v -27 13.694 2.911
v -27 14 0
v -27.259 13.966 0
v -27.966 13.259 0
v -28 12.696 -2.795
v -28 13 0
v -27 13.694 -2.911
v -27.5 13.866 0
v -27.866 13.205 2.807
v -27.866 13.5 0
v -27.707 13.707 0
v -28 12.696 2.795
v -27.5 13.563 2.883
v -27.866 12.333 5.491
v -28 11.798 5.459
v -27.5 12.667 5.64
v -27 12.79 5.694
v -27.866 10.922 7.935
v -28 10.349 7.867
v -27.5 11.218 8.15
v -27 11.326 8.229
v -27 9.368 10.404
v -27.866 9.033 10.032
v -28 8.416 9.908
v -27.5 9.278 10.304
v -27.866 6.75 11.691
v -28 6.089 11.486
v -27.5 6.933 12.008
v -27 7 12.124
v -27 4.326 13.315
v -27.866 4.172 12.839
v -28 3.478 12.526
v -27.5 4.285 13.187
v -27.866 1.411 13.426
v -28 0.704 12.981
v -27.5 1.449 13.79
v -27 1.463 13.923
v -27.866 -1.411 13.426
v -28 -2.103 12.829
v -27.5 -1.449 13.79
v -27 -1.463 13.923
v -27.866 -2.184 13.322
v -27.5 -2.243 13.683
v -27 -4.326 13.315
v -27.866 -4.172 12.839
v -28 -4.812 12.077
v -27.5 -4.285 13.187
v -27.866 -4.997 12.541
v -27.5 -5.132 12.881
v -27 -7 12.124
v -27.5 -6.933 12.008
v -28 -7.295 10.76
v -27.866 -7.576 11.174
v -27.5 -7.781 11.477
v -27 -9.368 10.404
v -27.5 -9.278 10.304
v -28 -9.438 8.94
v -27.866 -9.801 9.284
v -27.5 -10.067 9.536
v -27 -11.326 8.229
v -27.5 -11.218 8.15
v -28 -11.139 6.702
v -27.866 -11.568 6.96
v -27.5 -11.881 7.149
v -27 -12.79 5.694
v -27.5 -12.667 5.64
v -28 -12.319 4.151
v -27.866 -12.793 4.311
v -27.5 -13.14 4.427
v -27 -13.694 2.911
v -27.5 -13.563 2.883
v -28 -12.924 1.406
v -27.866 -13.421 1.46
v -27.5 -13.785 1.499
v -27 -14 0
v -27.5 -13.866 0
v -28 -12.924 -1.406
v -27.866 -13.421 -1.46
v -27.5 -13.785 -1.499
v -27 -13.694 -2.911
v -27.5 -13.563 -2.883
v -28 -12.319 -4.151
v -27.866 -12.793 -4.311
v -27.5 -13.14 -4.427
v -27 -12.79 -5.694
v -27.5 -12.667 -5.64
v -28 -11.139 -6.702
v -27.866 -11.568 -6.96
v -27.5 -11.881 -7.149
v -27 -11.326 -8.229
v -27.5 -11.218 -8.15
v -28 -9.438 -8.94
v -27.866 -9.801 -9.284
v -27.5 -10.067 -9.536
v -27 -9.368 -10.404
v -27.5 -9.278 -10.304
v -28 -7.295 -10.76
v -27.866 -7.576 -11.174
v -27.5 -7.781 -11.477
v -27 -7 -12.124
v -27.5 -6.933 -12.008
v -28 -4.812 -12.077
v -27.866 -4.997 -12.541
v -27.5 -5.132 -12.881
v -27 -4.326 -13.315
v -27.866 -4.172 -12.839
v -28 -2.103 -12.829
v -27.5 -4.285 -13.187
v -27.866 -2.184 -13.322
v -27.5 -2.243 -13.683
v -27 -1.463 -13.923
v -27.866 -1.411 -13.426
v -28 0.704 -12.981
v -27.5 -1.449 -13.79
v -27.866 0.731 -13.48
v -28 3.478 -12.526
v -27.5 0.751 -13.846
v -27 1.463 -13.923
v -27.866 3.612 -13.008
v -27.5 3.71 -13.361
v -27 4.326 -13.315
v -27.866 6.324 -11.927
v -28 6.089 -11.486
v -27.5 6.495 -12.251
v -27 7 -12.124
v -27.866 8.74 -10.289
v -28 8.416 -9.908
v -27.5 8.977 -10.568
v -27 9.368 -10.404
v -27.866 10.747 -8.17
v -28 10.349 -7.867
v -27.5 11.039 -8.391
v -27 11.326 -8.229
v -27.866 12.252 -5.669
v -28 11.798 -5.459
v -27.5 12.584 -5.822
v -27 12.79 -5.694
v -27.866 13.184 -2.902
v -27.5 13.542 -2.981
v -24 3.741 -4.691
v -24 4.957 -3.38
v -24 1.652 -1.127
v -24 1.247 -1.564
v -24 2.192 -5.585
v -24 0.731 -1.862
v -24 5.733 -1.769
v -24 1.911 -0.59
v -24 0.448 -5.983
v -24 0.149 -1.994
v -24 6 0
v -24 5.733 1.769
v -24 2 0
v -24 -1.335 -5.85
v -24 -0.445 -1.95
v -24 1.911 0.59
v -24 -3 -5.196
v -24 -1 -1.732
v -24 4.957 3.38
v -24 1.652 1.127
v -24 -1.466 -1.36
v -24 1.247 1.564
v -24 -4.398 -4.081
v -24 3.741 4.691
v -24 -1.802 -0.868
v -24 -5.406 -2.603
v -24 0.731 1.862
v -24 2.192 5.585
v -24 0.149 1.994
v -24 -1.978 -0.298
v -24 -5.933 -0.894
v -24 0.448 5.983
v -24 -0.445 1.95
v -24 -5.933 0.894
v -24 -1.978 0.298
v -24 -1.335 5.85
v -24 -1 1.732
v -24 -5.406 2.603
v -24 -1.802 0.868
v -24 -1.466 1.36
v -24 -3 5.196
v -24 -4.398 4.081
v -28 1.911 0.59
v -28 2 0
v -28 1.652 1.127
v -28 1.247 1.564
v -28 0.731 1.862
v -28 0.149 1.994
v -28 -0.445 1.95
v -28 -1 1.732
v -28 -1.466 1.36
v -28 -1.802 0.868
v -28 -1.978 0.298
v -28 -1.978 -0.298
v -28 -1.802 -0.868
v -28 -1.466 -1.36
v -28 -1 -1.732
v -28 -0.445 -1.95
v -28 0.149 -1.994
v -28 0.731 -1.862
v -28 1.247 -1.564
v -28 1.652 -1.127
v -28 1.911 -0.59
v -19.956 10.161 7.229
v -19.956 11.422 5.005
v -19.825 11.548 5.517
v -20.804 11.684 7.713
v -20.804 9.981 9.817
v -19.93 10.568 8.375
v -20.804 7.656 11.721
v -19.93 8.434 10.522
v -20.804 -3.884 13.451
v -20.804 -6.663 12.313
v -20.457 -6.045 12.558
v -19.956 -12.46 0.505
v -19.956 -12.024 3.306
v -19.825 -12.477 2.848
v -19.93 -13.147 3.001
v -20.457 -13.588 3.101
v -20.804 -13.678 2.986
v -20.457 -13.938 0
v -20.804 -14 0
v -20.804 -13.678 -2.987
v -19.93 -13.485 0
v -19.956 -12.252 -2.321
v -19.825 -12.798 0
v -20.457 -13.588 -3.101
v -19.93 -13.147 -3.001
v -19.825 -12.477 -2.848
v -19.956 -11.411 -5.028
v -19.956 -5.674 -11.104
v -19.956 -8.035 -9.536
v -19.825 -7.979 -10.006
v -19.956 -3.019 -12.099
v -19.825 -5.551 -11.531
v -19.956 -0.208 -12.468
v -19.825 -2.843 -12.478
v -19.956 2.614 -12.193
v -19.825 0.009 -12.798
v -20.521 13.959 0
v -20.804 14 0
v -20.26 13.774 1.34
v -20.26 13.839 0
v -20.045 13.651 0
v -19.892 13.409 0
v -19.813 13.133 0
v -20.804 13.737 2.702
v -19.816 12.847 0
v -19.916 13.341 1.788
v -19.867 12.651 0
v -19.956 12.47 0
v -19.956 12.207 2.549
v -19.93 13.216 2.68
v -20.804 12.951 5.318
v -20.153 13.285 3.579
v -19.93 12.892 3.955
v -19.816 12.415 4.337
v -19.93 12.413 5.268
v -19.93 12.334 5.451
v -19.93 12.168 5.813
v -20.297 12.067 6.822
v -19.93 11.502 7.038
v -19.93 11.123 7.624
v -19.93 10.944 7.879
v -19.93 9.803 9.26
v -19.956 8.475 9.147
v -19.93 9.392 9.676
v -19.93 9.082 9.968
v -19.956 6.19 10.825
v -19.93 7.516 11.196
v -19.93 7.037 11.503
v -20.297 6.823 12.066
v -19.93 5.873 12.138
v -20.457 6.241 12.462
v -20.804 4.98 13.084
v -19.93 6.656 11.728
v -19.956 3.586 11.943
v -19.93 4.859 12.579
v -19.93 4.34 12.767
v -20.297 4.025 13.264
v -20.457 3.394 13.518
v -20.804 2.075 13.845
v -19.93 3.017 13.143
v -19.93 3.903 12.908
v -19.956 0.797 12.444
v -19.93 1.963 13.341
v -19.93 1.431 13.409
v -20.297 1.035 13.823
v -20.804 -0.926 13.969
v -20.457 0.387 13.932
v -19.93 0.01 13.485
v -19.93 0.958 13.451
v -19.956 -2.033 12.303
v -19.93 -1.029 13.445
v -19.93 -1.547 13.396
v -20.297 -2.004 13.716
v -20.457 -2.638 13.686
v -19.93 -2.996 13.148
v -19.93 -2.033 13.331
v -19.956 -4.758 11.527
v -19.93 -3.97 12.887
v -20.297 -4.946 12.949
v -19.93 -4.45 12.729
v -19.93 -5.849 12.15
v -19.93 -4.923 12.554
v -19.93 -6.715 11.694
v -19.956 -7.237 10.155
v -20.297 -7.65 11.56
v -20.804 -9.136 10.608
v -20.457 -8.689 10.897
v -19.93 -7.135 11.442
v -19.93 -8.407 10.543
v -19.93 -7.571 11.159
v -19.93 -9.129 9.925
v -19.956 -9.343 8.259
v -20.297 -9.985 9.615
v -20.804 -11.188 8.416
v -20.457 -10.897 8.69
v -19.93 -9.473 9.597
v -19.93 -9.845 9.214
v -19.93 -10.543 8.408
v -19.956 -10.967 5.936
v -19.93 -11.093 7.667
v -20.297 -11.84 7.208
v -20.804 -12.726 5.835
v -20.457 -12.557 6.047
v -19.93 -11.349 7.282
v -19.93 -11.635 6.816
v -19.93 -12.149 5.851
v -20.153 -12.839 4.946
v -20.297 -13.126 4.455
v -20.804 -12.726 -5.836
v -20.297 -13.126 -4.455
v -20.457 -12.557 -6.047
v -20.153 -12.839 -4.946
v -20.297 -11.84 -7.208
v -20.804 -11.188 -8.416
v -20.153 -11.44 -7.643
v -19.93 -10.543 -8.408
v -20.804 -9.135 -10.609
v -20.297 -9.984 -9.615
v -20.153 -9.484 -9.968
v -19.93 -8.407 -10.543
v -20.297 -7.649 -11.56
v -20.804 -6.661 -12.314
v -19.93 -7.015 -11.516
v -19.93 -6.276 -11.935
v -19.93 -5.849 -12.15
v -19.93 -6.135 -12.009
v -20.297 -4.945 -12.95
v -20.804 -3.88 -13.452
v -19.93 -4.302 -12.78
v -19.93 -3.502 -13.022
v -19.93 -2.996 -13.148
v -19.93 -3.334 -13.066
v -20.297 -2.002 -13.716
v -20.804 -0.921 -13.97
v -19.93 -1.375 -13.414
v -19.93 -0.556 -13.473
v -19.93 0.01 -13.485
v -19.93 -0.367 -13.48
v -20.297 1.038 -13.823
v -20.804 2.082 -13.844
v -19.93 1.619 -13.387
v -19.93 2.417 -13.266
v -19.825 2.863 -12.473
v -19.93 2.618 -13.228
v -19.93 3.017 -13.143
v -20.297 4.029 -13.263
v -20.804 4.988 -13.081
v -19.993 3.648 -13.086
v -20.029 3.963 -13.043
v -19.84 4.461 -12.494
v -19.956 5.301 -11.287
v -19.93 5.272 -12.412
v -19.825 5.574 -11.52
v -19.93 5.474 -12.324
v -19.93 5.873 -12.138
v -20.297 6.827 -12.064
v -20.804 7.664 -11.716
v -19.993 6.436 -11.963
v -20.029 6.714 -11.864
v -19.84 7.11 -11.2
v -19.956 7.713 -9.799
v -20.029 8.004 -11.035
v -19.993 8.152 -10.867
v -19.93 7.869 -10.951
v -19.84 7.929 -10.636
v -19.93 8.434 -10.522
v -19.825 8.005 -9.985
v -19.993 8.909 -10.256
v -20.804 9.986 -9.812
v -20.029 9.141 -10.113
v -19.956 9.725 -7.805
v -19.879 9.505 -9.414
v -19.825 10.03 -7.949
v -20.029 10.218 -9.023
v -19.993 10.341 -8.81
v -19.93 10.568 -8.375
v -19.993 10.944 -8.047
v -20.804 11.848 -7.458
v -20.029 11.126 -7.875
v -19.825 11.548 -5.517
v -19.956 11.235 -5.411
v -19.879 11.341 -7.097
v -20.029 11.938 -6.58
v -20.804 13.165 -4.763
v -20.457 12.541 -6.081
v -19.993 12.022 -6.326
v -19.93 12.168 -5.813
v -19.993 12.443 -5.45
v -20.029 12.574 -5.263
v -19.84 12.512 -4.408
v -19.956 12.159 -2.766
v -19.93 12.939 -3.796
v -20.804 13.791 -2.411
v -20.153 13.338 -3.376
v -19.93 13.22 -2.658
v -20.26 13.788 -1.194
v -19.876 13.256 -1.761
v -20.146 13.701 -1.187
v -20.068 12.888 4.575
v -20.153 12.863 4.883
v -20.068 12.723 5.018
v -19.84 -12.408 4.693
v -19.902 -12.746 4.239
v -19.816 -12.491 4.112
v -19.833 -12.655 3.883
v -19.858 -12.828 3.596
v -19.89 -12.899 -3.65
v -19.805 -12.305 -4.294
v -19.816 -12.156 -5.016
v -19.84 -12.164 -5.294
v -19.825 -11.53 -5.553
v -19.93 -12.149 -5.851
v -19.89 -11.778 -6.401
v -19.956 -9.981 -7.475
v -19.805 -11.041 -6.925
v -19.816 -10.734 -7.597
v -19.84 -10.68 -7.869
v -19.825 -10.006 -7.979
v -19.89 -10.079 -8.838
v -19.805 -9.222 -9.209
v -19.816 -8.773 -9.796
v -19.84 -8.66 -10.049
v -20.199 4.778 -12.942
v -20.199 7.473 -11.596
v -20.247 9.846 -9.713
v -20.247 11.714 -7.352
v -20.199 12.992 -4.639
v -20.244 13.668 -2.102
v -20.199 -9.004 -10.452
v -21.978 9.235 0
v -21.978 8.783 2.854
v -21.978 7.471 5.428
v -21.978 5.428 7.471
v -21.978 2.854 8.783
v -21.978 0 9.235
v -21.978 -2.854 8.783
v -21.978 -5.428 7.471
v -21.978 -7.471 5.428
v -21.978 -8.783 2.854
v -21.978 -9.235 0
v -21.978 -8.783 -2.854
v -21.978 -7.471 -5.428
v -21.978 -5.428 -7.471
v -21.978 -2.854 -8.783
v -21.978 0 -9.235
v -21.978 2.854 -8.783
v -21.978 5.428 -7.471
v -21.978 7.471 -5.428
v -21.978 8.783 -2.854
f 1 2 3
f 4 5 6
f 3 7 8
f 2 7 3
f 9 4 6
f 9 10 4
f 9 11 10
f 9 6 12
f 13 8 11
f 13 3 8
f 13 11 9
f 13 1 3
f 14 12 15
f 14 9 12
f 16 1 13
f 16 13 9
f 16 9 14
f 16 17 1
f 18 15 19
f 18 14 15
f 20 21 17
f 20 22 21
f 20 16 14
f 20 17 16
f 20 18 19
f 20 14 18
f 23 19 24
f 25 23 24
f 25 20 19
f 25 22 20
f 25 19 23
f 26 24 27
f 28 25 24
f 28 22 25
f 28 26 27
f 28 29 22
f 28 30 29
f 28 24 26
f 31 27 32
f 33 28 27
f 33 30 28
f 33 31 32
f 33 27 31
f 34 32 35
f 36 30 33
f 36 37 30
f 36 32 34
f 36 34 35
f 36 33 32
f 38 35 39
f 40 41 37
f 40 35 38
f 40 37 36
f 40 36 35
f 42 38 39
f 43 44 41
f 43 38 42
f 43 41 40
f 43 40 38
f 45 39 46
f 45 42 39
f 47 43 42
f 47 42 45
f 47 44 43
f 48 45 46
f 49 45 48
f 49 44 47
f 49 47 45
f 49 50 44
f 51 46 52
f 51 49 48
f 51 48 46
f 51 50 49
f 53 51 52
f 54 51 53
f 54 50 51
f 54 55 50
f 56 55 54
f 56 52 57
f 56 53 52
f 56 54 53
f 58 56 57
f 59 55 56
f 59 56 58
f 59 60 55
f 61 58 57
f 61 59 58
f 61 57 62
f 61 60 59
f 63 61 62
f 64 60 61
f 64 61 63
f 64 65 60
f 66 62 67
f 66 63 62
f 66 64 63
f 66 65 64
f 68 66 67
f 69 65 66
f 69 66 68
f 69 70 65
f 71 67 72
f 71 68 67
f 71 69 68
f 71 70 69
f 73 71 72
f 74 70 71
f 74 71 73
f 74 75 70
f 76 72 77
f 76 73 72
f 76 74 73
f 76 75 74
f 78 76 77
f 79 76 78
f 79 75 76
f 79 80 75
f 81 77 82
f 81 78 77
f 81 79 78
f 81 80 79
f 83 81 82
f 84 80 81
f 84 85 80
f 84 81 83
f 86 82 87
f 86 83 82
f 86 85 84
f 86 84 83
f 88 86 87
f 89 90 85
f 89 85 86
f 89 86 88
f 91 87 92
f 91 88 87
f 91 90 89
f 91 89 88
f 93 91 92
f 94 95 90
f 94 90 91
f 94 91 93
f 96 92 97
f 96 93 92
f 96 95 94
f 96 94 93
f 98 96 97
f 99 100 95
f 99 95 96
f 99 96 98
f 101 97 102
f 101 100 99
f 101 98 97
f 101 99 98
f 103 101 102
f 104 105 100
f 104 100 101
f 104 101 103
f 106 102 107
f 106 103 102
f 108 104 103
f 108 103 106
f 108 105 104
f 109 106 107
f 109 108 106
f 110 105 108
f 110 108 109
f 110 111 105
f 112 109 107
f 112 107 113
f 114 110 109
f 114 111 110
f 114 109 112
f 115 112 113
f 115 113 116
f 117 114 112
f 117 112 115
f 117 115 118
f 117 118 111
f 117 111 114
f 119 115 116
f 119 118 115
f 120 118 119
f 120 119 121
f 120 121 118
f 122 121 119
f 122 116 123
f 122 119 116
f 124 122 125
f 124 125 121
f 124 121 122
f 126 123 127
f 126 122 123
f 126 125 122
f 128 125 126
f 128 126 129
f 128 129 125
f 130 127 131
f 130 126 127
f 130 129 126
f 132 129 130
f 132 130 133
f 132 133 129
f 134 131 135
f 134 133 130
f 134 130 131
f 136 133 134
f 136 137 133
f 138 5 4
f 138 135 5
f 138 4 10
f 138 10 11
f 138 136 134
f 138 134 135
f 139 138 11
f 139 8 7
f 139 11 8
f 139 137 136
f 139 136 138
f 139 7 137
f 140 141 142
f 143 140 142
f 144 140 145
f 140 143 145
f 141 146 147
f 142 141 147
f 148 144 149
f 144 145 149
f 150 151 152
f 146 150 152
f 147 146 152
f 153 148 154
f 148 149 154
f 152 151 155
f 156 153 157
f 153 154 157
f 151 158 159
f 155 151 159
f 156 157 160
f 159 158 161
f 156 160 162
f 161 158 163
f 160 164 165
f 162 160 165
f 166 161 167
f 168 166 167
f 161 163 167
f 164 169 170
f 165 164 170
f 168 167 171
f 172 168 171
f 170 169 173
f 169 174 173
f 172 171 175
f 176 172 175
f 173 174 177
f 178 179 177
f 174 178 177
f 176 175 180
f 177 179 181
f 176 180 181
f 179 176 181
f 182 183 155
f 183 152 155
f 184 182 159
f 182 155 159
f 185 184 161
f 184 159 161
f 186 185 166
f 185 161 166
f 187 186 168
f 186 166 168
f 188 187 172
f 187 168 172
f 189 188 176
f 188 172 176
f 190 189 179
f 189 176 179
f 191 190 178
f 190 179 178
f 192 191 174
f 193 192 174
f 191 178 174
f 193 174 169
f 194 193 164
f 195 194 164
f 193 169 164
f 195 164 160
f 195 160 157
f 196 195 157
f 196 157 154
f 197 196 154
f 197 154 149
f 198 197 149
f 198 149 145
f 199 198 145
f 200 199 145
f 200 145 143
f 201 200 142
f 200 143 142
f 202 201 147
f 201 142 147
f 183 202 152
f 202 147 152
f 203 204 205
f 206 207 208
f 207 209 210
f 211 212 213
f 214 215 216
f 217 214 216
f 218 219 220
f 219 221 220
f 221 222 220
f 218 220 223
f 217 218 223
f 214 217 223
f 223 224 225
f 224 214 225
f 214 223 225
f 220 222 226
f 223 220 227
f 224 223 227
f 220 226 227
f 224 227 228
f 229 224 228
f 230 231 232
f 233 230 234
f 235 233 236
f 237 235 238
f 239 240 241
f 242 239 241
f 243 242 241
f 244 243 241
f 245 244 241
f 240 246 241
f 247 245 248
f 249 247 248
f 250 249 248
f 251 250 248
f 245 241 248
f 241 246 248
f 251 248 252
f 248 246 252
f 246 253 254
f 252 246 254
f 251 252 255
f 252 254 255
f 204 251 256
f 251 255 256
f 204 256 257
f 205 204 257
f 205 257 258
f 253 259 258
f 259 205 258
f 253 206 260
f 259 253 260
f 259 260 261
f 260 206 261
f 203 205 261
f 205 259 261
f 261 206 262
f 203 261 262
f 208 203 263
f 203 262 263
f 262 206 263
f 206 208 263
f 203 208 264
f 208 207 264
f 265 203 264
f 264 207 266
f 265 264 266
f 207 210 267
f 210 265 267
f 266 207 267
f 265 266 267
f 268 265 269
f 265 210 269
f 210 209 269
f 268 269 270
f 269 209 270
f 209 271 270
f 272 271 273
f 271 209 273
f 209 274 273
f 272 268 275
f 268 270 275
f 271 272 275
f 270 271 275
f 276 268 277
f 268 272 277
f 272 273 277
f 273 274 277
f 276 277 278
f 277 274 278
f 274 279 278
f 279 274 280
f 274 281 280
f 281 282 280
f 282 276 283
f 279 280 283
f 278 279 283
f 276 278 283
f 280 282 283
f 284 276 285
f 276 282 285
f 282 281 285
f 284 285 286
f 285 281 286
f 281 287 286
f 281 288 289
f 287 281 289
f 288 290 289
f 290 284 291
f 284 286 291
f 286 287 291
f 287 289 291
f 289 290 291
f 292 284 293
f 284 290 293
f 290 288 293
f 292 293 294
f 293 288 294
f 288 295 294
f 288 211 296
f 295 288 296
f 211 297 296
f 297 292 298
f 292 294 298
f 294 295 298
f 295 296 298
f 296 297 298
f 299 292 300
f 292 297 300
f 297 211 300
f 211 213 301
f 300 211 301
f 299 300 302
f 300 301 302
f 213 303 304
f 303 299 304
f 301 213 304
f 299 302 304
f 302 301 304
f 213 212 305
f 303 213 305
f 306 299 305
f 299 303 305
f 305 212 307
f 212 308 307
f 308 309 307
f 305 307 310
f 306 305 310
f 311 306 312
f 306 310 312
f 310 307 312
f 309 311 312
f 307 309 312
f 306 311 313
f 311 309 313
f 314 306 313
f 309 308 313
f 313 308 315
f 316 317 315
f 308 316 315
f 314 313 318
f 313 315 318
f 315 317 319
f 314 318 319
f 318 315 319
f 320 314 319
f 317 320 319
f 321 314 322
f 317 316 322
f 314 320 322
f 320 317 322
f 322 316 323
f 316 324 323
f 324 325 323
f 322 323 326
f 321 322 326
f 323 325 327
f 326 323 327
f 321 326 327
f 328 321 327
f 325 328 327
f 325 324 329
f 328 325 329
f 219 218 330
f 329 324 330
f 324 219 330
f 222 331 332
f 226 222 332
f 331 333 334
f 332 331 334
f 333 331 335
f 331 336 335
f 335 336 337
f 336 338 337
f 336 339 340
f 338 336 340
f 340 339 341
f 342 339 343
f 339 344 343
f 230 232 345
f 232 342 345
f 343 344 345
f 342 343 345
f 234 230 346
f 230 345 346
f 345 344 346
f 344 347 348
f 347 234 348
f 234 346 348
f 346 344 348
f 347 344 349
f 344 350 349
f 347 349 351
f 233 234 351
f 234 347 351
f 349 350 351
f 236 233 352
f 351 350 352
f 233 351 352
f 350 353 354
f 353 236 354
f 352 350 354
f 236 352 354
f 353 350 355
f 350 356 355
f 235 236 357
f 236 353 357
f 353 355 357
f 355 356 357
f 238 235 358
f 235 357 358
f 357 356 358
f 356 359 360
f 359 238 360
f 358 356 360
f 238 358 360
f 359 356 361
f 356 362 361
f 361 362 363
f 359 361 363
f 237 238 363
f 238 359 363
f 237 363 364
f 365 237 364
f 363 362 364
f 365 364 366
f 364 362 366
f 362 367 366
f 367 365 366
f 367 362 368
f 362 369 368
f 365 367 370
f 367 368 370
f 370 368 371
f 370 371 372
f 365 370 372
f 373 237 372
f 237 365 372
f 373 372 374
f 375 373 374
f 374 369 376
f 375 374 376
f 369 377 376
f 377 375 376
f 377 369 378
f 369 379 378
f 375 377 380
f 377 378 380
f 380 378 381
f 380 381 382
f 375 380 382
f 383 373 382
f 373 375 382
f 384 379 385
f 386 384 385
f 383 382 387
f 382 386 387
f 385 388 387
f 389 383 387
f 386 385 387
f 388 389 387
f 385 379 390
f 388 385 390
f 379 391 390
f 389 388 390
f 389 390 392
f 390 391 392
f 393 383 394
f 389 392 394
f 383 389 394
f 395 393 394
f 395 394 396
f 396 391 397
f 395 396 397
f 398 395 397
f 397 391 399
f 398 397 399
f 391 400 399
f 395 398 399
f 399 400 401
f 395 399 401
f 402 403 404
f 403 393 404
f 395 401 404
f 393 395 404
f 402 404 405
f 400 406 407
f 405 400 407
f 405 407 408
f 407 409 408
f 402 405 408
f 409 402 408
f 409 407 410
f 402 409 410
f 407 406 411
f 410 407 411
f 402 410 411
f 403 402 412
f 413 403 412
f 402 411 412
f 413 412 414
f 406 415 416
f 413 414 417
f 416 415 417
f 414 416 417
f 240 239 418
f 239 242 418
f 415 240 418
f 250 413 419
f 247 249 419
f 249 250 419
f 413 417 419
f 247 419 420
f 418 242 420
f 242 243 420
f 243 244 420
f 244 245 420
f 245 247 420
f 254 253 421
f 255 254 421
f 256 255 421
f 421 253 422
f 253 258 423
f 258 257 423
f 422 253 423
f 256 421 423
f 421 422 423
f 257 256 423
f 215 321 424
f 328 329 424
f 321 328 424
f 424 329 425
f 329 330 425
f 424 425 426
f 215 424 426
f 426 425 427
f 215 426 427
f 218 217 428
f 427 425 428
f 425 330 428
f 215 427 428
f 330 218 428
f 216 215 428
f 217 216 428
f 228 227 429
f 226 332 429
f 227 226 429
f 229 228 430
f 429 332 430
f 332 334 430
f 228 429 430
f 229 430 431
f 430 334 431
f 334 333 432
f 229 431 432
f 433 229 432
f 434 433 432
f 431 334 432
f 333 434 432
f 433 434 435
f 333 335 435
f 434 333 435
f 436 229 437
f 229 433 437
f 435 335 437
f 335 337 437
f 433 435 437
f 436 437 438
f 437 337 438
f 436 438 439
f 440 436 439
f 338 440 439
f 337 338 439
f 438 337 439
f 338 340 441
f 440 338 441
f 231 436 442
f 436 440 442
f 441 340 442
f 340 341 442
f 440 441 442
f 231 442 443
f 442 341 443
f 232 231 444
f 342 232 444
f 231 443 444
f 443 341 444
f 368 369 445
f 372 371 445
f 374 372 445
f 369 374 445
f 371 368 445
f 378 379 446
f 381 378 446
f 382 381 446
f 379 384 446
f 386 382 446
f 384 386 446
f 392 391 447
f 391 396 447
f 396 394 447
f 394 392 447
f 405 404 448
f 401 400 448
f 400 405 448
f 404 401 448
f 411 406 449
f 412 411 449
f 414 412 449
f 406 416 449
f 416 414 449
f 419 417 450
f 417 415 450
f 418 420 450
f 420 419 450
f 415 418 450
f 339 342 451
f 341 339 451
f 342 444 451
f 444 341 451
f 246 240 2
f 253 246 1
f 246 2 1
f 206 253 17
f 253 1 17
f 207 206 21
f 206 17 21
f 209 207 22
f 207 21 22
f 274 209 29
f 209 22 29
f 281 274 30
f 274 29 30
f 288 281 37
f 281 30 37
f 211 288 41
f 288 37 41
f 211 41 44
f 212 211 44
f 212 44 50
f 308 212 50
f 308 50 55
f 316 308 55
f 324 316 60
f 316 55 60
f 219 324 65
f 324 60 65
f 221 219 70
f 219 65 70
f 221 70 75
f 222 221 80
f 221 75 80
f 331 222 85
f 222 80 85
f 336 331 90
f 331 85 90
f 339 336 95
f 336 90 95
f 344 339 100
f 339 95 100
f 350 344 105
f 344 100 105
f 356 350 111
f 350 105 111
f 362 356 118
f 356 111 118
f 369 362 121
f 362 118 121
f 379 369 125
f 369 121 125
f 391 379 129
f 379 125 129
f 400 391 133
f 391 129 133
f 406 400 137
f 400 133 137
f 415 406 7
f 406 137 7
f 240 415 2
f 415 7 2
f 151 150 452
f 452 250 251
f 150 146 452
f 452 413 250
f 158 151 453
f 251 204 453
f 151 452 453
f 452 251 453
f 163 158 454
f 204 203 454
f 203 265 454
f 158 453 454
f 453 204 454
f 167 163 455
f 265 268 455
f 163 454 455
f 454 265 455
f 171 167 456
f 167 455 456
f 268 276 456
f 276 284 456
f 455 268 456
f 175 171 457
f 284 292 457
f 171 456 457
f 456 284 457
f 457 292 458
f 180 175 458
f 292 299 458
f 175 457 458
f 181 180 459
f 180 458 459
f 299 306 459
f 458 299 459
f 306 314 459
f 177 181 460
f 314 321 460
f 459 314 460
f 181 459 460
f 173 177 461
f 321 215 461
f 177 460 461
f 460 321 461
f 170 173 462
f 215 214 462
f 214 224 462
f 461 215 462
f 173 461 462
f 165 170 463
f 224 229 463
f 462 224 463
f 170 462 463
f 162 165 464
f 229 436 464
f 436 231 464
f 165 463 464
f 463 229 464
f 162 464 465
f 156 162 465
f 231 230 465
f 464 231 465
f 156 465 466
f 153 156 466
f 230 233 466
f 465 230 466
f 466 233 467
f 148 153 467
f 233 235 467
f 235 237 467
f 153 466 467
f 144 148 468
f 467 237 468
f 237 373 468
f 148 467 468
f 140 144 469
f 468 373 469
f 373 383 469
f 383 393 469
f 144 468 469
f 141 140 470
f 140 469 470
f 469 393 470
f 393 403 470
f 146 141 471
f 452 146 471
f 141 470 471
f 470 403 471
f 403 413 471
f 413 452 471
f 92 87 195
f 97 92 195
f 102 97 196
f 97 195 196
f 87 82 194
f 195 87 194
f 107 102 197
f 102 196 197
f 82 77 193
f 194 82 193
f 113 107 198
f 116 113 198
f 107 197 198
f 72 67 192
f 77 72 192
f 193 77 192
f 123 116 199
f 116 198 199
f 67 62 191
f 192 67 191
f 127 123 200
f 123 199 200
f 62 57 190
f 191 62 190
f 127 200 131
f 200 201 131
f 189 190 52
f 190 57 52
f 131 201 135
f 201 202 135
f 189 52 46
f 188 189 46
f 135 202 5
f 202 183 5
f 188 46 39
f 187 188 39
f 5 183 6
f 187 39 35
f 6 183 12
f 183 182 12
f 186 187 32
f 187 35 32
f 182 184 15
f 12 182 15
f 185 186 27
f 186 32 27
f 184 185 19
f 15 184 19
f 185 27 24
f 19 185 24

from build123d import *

# Parameters (mm, degrees)
FILLET001_R = 1
FILLET002_R = 1


with BuildPart() as part:
    # Sketch004 → Revolution (revolve)
    with BuildSketch(Plane.XY):
        Polygon((2, 14), (2, 2), (6, 2), (6, 6), (11, 14), align=None)
    revolve(axis=Axis((0, 0, 0), (1, 0, 0)))

    # Fillet001
    fillet001_edges = [part.edges().sort_by_distance(p)[0] for p in [
        (2, -14, 0),
    ]]
    fillet(fillet001_edges, radius=FILLET001_R)

    # Fillet002
    fillet002_edges = [part.edges().sort_by_distance(p)[0] for p in [
        (11, -14, 0),
    ]]
    fillet(fillet002_edges, radius=FILLET002_R)


with BuildPart() as part_1:
    # Body001 placement: moved
    add(part.part.moved(Location((-30, 0, 0))))


solid = part_1.part
